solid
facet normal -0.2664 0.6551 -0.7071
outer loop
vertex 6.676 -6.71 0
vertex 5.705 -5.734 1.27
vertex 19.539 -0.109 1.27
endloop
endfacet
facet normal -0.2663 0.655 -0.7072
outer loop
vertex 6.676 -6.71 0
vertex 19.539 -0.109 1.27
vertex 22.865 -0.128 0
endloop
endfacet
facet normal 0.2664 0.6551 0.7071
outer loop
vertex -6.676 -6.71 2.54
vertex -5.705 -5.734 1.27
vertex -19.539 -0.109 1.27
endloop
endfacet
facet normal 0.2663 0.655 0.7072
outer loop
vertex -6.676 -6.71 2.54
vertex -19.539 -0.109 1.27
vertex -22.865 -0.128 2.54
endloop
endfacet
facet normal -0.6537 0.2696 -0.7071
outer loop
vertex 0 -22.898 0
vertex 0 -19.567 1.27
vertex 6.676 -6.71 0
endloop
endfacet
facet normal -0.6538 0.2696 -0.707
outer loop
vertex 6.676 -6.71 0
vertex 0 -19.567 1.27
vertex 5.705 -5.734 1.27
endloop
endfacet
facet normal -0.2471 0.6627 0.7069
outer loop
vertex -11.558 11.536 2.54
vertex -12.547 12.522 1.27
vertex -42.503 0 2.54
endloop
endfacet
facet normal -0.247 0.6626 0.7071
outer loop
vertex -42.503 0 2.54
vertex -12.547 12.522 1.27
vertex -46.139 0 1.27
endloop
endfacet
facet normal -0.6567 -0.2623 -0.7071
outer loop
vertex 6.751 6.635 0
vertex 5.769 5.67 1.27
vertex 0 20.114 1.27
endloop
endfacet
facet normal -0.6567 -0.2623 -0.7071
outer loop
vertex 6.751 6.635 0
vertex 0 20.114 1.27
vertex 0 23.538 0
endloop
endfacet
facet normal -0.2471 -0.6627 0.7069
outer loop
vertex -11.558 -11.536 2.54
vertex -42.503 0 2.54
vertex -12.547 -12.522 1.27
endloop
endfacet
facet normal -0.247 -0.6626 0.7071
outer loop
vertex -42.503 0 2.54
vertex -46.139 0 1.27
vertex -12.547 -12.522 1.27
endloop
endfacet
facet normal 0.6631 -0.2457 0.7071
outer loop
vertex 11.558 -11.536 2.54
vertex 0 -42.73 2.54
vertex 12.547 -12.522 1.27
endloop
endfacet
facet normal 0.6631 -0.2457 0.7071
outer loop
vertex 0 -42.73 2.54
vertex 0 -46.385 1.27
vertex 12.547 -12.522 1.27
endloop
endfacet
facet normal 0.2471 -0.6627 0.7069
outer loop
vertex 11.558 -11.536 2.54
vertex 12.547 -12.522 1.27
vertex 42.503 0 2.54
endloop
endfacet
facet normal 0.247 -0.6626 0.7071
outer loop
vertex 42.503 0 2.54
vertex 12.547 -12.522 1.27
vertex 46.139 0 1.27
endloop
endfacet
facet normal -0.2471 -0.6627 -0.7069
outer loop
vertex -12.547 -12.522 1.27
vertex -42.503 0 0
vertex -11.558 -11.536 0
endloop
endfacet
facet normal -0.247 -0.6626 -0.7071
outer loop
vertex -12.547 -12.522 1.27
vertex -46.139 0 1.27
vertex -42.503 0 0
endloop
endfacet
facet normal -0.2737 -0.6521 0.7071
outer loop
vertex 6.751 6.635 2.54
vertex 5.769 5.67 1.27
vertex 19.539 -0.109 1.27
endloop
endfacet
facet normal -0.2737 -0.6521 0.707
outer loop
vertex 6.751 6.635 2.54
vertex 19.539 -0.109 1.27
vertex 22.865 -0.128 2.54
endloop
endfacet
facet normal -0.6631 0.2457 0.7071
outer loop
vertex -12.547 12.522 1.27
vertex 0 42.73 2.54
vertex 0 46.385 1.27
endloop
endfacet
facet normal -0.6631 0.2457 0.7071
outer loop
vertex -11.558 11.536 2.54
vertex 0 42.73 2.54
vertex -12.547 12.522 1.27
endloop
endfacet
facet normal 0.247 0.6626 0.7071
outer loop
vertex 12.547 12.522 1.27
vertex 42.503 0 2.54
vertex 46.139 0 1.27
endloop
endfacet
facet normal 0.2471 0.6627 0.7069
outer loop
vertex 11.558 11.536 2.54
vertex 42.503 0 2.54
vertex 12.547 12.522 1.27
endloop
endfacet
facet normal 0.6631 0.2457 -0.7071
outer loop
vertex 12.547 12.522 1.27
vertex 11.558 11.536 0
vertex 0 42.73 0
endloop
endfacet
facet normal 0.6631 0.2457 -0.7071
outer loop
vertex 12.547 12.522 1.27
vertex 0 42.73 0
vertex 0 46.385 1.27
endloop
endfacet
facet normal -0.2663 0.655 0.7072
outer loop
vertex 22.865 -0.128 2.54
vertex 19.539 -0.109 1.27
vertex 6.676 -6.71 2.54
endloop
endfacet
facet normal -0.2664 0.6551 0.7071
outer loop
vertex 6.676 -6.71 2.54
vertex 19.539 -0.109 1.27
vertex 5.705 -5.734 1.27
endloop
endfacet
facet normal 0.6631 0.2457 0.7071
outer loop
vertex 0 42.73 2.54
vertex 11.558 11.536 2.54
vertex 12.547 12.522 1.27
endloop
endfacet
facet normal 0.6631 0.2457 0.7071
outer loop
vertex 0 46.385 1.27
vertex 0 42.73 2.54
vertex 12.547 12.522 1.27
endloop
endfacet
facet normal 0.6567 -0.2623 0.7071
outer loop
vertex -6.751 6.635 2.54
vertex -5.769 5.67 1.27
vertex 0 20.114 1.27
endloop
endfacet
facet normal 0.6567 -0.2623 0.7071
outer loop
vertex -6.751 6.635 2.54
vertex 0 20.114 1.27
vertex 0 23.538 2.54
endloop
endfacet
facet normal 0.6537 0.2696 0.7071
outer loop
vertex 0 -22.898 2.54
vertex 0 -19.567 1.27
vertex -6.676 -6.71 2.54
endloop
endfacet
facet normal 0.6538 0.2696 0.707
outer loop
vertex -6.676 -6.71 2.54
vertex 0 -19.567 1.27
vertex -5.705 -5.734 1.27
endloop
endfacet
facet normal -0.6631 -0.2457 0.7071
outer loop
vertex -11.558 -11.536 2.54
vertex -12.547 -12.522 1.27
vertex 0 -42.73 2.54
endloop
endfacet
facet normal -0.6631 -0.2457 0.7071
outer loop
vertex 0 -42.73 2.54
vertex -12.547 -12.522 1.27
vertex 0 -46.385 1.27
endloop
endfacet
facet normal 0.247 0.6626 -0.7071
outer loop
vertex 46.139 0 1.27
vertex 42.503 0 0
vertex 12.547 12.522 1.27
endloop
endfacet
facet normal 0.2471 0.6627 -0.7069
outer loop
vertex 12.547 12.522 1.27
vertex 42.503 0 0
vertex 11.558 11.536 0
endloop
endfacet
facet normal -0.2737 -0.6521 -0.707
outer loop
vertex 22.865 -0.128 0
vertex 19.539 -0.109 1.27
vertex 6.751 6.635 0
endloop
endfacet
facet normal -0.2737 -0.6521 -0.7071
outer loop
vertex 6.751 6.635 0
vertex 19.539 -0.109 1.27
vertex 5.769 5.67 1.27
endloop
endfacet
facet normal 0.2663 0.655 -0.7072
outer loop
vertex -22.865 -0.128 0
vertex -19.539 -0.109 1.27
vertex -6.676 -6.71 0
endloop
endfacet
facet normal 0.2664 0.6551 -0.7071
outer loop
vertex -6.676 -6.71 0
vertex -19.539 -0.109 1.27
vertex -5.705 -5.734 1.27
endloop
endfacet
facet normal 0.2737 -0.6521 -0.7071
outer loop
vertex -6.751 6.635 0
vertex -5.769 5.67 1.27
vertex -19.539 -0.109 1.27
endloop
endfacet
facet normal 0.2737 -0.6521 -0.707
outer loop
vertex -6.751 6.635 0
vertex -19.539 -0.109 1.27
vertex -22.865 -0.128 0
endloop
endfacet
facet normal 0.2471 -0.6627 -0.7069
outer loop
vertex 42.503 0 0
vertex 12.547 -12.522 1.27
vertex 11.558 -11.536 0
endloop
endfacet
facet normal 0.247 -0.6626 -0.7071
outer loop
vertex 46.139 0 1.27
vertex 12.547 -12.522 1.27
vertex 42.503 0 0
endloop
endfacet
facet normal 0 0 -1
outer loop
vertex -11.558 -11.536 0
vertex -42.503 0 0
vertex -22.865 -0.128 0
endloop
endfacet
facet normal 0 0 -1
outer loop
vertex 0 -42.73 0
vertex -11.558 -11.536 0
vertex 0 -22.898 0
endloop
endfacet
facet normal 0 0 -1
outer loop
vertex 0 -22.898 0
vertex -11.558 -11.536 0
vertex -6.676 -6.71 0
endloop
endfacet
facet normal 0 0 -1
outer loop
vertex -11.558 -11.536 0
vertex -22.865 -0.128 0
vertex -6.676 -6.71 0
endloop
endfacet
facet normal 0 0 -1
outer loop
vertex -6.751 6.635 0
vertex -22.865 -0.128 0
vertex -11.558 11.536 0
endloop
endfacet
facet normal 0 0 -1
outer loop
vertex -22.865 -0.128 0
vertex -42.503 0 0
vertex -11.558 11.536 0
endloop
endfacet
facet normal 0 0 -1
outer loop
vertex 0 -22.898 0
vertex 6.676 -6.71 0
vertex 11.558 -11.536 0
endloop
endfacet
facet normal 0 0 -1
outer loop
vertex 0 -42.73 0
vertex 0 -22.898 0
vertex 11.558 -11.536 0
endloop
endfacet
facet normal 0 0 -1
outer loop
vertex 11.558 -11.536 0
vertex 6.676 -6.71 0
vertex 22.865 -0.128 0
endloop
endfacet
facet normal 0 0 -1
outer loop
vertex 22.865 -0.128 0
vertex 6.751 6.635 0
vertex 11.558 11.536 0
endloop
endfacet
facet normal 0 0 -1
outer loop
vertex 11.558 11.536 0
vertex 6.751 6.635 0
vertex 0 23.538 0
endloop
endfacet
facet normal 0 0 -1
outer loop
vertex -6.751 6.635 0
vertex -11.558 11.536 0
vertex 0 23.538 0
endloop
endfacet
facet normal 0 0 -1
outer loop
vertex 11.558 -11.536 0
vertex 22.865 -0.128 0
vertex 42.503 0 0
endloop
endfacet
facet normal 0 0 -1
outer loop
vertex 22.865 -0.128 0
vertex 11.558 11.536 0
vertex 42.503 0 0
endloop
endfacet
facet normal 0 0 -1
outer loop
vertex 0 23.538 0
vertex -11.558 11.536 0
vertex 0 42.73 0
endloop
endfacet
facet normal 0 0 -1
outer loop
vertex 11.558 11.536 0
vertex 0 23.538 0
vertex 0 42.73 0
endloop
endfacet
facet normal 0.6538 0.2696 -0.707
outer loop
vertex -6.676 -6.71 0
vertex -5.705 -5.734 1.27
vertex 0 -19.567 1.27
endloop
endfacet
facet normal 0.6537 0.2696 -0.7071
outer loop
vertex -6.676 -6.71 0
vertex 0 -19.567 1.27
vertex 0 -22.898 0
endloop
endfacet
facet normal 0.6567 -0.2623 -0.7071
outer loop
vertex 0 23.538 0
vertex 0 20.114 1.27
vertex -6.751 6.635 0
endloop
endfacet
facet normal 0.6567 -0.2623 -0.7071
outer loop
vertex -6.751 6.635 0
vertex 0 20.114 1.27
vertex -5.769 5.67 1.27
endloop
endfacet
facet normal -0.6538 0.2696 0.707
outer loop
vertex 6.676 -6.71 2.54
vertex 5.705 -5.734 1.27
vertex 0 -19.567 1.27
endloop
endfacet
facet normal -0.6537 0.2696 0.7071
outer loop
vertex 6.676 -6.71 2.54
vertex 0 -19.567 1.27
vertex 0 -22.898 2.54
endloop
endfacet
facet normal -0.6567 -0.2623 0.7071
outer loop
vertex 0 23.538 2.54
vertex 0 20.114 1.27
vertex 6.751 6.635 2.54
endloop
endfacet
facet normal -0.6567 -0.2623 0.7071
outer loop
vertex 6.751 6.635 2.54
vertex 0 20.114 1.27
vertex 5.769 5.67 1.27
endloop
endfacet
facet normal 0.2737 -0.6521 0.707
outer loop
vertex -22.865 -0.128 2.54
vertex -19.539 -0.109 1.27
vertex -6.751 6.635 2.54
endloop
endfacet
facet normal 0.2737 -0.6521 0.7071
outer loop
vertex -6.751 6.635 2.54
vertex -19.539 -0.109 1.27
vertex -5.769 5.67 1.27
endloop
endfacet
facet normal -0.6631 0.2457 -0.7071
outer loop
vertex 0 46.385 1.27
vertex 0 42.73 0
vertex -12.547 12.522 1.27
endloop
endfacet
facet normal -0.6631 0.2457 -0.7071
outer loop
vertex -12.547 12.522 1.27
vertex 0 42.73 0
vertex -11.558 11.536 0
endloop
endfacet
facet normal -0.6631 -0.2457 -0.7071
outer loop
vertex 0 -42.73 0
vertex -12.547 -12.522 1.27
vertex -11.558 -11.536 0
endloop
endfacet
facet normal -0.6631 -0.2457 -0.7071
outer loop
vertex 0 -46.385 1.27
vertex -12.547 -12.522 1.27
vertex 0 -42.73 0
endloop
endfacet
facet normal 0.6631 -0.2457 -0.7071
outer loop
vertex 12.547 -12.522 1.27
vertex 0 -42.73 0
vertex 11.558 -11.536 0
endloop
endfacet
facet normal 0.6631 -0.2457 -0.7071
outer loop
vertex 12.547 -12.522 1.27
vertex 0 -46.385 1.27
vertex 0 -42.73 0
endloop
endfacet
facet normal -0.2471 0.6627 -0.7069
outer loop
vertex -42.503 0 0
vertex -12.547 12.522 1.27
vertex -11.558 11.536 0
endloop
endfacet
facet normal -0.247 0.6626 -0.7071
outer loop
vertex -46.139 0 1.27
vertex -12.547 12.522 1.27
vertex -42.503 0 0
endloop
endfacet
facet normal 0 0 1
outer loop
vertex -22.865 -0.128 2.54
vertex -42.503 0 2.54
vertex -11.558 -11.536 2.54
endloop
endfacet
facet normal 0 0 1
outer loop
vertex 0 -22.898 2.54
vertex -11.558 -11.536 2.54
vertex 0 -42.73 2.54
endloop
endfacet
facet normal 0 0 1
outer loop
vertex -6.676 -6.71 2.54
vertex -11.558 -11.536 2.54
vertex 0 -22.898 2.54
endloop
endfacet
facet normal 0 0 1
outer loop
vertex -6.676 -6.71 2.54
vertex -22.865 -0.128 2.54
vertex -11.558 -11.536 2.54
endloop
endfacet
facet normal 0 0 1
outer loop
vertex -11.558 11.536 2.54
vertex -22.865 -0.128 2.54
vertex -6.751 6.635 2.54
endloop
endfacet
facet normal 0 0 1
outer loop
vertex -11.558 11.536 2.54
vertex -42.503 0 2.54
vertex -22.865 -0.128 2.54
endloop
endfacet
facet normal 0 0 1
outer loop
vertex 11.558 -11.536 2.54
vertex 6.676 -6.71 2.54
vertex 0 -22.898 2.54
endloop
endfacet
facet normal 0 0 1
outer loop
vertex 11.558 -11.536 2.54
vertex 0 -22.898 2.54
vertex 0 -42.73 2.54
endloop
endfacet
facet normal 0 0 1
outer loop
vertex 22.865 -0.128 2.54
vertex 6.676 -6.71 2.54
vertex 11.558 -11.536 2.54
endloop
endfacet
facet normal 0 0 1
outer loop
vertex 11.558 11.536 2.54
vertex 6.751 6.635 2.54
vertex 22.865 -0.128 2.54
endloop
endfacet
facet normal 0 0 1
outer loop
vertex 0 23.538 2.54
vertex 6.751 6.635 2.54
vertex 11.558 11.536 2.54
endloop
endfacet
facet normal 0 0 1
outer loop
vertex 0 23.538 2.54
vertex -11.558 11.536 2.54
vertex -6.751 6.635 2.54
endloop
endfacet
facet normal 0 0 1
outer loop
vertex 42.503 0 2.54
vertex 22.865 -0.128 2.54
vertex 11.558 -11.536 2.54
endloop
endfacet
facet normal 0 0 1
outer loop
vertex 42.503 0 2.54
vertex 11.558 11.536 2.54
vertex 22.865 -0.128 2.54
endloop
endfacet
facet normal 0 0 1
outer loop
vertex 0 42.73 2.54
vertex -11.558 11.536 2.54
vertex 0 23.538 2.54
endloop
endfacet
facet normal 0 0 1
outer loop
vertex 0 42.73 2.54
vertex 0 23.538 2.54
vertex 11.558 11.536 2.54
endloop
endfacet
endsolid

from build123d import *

# Parameters (mm, degrees)
F2_DEPTH = 2.54
F3_DEPTH = 23.622
F4_SIZE  = 1.26999


# Not quite as in the source:
# - a fillet or chamfer is up to 0.001 mm smaller than in the source, because OpenCascade refuses the exact size


with BuildPart() as f2:
    # F0 (on Top) → F2 (new body)
    with BuildSketch(Plane.XY):
        Polygon((12.5471574406, 12.5223604022), (0, 46.3847853243), (-12.5471574406, 12.5223604022), (-46.1385440799, 0), (-12.5471574406, -12.5223604022), (0, -46.3847853243), (12.5471574406, -12.5223604022), (46.1385440799, 0), align=None)
    extrude(amount=F2_DEPTH)

    # F1 (on Top) → F3 (cut)
    with BuildSketch(Plane.XY):
        Polygon((5.7690664033, 5.6696828615), (0, 20.1142430305), (-5.7690664033, 5.6696828615), (-19.5389121215, -0.109308556), (-5.705270301, -5.7338749296), (0, -19.5673167638), (5.705270301, -5.7338749296), (19.5389121215, -0.109308556), align=None)
    extrude(amount=F3_DEPTH, mode=Mode.SUBTRACT)

    # F4 (size 1.27 in the source; OpenCascade refuses exactly that, so slightly less here)
    f4_edges = [f2.edges().sort_by_distance(p)[0] for p in [
        (6.273579, -29.453573, 2.54),
        (-6.273579, -29.453573, 2.54),
        (-29.342851, -6.26118, 2.54),
        (-29.342851, 6.26118, 2.54),
        (-6.273579, 29.453573, 2.54),
        (6.273579, 29.453573, 2.54),
        (29.342851, 6.26118, 2.54),
        (29.342851, -6.26118, 2.54),
        (-6.273579, 29.453573, 0),
        (29.342851, 6.26118, 0),
        (6.273579, 29.453573, 0),
        (29.342851, -6.26118, 0),
        (6.273579, -29.453573, 0),
        (-6.273579, -29.453573, 0),
        (-29.342851, -6.26118, 0),
        (-29.342851, 6.26118, 0),
        (-12.653989, 2.780187, 0),
        (12.653989, 2.780187, 2.54),
        (2.884533, 12.891963, 2.54),
        (-2.884533, 12.891963, 2.54),
        (-12.653989, 2.780187, 2.54),
        (-12.622091, -2.921592, 2.54),
        (-2.852635, -12.650596, 2.54),
        (2.852635, -12.650596, 2.54),
        (12.622091, -2.921592, 2.54),
        (-12.622091, -2.921592, 0),
        (-2.852635, -12.650596, 0),
        (2.852635, -12.650596, 0),
        (12.622091, -2.921592, 0),
        (12.653989, 2.780187, 0),
        (2.884533, 12.891963, 0),
        (-2.884533, 12.891963, 0),
    ]]
    chamfer(f4_edges, length=F4_SIZE)


solid = f2.part
